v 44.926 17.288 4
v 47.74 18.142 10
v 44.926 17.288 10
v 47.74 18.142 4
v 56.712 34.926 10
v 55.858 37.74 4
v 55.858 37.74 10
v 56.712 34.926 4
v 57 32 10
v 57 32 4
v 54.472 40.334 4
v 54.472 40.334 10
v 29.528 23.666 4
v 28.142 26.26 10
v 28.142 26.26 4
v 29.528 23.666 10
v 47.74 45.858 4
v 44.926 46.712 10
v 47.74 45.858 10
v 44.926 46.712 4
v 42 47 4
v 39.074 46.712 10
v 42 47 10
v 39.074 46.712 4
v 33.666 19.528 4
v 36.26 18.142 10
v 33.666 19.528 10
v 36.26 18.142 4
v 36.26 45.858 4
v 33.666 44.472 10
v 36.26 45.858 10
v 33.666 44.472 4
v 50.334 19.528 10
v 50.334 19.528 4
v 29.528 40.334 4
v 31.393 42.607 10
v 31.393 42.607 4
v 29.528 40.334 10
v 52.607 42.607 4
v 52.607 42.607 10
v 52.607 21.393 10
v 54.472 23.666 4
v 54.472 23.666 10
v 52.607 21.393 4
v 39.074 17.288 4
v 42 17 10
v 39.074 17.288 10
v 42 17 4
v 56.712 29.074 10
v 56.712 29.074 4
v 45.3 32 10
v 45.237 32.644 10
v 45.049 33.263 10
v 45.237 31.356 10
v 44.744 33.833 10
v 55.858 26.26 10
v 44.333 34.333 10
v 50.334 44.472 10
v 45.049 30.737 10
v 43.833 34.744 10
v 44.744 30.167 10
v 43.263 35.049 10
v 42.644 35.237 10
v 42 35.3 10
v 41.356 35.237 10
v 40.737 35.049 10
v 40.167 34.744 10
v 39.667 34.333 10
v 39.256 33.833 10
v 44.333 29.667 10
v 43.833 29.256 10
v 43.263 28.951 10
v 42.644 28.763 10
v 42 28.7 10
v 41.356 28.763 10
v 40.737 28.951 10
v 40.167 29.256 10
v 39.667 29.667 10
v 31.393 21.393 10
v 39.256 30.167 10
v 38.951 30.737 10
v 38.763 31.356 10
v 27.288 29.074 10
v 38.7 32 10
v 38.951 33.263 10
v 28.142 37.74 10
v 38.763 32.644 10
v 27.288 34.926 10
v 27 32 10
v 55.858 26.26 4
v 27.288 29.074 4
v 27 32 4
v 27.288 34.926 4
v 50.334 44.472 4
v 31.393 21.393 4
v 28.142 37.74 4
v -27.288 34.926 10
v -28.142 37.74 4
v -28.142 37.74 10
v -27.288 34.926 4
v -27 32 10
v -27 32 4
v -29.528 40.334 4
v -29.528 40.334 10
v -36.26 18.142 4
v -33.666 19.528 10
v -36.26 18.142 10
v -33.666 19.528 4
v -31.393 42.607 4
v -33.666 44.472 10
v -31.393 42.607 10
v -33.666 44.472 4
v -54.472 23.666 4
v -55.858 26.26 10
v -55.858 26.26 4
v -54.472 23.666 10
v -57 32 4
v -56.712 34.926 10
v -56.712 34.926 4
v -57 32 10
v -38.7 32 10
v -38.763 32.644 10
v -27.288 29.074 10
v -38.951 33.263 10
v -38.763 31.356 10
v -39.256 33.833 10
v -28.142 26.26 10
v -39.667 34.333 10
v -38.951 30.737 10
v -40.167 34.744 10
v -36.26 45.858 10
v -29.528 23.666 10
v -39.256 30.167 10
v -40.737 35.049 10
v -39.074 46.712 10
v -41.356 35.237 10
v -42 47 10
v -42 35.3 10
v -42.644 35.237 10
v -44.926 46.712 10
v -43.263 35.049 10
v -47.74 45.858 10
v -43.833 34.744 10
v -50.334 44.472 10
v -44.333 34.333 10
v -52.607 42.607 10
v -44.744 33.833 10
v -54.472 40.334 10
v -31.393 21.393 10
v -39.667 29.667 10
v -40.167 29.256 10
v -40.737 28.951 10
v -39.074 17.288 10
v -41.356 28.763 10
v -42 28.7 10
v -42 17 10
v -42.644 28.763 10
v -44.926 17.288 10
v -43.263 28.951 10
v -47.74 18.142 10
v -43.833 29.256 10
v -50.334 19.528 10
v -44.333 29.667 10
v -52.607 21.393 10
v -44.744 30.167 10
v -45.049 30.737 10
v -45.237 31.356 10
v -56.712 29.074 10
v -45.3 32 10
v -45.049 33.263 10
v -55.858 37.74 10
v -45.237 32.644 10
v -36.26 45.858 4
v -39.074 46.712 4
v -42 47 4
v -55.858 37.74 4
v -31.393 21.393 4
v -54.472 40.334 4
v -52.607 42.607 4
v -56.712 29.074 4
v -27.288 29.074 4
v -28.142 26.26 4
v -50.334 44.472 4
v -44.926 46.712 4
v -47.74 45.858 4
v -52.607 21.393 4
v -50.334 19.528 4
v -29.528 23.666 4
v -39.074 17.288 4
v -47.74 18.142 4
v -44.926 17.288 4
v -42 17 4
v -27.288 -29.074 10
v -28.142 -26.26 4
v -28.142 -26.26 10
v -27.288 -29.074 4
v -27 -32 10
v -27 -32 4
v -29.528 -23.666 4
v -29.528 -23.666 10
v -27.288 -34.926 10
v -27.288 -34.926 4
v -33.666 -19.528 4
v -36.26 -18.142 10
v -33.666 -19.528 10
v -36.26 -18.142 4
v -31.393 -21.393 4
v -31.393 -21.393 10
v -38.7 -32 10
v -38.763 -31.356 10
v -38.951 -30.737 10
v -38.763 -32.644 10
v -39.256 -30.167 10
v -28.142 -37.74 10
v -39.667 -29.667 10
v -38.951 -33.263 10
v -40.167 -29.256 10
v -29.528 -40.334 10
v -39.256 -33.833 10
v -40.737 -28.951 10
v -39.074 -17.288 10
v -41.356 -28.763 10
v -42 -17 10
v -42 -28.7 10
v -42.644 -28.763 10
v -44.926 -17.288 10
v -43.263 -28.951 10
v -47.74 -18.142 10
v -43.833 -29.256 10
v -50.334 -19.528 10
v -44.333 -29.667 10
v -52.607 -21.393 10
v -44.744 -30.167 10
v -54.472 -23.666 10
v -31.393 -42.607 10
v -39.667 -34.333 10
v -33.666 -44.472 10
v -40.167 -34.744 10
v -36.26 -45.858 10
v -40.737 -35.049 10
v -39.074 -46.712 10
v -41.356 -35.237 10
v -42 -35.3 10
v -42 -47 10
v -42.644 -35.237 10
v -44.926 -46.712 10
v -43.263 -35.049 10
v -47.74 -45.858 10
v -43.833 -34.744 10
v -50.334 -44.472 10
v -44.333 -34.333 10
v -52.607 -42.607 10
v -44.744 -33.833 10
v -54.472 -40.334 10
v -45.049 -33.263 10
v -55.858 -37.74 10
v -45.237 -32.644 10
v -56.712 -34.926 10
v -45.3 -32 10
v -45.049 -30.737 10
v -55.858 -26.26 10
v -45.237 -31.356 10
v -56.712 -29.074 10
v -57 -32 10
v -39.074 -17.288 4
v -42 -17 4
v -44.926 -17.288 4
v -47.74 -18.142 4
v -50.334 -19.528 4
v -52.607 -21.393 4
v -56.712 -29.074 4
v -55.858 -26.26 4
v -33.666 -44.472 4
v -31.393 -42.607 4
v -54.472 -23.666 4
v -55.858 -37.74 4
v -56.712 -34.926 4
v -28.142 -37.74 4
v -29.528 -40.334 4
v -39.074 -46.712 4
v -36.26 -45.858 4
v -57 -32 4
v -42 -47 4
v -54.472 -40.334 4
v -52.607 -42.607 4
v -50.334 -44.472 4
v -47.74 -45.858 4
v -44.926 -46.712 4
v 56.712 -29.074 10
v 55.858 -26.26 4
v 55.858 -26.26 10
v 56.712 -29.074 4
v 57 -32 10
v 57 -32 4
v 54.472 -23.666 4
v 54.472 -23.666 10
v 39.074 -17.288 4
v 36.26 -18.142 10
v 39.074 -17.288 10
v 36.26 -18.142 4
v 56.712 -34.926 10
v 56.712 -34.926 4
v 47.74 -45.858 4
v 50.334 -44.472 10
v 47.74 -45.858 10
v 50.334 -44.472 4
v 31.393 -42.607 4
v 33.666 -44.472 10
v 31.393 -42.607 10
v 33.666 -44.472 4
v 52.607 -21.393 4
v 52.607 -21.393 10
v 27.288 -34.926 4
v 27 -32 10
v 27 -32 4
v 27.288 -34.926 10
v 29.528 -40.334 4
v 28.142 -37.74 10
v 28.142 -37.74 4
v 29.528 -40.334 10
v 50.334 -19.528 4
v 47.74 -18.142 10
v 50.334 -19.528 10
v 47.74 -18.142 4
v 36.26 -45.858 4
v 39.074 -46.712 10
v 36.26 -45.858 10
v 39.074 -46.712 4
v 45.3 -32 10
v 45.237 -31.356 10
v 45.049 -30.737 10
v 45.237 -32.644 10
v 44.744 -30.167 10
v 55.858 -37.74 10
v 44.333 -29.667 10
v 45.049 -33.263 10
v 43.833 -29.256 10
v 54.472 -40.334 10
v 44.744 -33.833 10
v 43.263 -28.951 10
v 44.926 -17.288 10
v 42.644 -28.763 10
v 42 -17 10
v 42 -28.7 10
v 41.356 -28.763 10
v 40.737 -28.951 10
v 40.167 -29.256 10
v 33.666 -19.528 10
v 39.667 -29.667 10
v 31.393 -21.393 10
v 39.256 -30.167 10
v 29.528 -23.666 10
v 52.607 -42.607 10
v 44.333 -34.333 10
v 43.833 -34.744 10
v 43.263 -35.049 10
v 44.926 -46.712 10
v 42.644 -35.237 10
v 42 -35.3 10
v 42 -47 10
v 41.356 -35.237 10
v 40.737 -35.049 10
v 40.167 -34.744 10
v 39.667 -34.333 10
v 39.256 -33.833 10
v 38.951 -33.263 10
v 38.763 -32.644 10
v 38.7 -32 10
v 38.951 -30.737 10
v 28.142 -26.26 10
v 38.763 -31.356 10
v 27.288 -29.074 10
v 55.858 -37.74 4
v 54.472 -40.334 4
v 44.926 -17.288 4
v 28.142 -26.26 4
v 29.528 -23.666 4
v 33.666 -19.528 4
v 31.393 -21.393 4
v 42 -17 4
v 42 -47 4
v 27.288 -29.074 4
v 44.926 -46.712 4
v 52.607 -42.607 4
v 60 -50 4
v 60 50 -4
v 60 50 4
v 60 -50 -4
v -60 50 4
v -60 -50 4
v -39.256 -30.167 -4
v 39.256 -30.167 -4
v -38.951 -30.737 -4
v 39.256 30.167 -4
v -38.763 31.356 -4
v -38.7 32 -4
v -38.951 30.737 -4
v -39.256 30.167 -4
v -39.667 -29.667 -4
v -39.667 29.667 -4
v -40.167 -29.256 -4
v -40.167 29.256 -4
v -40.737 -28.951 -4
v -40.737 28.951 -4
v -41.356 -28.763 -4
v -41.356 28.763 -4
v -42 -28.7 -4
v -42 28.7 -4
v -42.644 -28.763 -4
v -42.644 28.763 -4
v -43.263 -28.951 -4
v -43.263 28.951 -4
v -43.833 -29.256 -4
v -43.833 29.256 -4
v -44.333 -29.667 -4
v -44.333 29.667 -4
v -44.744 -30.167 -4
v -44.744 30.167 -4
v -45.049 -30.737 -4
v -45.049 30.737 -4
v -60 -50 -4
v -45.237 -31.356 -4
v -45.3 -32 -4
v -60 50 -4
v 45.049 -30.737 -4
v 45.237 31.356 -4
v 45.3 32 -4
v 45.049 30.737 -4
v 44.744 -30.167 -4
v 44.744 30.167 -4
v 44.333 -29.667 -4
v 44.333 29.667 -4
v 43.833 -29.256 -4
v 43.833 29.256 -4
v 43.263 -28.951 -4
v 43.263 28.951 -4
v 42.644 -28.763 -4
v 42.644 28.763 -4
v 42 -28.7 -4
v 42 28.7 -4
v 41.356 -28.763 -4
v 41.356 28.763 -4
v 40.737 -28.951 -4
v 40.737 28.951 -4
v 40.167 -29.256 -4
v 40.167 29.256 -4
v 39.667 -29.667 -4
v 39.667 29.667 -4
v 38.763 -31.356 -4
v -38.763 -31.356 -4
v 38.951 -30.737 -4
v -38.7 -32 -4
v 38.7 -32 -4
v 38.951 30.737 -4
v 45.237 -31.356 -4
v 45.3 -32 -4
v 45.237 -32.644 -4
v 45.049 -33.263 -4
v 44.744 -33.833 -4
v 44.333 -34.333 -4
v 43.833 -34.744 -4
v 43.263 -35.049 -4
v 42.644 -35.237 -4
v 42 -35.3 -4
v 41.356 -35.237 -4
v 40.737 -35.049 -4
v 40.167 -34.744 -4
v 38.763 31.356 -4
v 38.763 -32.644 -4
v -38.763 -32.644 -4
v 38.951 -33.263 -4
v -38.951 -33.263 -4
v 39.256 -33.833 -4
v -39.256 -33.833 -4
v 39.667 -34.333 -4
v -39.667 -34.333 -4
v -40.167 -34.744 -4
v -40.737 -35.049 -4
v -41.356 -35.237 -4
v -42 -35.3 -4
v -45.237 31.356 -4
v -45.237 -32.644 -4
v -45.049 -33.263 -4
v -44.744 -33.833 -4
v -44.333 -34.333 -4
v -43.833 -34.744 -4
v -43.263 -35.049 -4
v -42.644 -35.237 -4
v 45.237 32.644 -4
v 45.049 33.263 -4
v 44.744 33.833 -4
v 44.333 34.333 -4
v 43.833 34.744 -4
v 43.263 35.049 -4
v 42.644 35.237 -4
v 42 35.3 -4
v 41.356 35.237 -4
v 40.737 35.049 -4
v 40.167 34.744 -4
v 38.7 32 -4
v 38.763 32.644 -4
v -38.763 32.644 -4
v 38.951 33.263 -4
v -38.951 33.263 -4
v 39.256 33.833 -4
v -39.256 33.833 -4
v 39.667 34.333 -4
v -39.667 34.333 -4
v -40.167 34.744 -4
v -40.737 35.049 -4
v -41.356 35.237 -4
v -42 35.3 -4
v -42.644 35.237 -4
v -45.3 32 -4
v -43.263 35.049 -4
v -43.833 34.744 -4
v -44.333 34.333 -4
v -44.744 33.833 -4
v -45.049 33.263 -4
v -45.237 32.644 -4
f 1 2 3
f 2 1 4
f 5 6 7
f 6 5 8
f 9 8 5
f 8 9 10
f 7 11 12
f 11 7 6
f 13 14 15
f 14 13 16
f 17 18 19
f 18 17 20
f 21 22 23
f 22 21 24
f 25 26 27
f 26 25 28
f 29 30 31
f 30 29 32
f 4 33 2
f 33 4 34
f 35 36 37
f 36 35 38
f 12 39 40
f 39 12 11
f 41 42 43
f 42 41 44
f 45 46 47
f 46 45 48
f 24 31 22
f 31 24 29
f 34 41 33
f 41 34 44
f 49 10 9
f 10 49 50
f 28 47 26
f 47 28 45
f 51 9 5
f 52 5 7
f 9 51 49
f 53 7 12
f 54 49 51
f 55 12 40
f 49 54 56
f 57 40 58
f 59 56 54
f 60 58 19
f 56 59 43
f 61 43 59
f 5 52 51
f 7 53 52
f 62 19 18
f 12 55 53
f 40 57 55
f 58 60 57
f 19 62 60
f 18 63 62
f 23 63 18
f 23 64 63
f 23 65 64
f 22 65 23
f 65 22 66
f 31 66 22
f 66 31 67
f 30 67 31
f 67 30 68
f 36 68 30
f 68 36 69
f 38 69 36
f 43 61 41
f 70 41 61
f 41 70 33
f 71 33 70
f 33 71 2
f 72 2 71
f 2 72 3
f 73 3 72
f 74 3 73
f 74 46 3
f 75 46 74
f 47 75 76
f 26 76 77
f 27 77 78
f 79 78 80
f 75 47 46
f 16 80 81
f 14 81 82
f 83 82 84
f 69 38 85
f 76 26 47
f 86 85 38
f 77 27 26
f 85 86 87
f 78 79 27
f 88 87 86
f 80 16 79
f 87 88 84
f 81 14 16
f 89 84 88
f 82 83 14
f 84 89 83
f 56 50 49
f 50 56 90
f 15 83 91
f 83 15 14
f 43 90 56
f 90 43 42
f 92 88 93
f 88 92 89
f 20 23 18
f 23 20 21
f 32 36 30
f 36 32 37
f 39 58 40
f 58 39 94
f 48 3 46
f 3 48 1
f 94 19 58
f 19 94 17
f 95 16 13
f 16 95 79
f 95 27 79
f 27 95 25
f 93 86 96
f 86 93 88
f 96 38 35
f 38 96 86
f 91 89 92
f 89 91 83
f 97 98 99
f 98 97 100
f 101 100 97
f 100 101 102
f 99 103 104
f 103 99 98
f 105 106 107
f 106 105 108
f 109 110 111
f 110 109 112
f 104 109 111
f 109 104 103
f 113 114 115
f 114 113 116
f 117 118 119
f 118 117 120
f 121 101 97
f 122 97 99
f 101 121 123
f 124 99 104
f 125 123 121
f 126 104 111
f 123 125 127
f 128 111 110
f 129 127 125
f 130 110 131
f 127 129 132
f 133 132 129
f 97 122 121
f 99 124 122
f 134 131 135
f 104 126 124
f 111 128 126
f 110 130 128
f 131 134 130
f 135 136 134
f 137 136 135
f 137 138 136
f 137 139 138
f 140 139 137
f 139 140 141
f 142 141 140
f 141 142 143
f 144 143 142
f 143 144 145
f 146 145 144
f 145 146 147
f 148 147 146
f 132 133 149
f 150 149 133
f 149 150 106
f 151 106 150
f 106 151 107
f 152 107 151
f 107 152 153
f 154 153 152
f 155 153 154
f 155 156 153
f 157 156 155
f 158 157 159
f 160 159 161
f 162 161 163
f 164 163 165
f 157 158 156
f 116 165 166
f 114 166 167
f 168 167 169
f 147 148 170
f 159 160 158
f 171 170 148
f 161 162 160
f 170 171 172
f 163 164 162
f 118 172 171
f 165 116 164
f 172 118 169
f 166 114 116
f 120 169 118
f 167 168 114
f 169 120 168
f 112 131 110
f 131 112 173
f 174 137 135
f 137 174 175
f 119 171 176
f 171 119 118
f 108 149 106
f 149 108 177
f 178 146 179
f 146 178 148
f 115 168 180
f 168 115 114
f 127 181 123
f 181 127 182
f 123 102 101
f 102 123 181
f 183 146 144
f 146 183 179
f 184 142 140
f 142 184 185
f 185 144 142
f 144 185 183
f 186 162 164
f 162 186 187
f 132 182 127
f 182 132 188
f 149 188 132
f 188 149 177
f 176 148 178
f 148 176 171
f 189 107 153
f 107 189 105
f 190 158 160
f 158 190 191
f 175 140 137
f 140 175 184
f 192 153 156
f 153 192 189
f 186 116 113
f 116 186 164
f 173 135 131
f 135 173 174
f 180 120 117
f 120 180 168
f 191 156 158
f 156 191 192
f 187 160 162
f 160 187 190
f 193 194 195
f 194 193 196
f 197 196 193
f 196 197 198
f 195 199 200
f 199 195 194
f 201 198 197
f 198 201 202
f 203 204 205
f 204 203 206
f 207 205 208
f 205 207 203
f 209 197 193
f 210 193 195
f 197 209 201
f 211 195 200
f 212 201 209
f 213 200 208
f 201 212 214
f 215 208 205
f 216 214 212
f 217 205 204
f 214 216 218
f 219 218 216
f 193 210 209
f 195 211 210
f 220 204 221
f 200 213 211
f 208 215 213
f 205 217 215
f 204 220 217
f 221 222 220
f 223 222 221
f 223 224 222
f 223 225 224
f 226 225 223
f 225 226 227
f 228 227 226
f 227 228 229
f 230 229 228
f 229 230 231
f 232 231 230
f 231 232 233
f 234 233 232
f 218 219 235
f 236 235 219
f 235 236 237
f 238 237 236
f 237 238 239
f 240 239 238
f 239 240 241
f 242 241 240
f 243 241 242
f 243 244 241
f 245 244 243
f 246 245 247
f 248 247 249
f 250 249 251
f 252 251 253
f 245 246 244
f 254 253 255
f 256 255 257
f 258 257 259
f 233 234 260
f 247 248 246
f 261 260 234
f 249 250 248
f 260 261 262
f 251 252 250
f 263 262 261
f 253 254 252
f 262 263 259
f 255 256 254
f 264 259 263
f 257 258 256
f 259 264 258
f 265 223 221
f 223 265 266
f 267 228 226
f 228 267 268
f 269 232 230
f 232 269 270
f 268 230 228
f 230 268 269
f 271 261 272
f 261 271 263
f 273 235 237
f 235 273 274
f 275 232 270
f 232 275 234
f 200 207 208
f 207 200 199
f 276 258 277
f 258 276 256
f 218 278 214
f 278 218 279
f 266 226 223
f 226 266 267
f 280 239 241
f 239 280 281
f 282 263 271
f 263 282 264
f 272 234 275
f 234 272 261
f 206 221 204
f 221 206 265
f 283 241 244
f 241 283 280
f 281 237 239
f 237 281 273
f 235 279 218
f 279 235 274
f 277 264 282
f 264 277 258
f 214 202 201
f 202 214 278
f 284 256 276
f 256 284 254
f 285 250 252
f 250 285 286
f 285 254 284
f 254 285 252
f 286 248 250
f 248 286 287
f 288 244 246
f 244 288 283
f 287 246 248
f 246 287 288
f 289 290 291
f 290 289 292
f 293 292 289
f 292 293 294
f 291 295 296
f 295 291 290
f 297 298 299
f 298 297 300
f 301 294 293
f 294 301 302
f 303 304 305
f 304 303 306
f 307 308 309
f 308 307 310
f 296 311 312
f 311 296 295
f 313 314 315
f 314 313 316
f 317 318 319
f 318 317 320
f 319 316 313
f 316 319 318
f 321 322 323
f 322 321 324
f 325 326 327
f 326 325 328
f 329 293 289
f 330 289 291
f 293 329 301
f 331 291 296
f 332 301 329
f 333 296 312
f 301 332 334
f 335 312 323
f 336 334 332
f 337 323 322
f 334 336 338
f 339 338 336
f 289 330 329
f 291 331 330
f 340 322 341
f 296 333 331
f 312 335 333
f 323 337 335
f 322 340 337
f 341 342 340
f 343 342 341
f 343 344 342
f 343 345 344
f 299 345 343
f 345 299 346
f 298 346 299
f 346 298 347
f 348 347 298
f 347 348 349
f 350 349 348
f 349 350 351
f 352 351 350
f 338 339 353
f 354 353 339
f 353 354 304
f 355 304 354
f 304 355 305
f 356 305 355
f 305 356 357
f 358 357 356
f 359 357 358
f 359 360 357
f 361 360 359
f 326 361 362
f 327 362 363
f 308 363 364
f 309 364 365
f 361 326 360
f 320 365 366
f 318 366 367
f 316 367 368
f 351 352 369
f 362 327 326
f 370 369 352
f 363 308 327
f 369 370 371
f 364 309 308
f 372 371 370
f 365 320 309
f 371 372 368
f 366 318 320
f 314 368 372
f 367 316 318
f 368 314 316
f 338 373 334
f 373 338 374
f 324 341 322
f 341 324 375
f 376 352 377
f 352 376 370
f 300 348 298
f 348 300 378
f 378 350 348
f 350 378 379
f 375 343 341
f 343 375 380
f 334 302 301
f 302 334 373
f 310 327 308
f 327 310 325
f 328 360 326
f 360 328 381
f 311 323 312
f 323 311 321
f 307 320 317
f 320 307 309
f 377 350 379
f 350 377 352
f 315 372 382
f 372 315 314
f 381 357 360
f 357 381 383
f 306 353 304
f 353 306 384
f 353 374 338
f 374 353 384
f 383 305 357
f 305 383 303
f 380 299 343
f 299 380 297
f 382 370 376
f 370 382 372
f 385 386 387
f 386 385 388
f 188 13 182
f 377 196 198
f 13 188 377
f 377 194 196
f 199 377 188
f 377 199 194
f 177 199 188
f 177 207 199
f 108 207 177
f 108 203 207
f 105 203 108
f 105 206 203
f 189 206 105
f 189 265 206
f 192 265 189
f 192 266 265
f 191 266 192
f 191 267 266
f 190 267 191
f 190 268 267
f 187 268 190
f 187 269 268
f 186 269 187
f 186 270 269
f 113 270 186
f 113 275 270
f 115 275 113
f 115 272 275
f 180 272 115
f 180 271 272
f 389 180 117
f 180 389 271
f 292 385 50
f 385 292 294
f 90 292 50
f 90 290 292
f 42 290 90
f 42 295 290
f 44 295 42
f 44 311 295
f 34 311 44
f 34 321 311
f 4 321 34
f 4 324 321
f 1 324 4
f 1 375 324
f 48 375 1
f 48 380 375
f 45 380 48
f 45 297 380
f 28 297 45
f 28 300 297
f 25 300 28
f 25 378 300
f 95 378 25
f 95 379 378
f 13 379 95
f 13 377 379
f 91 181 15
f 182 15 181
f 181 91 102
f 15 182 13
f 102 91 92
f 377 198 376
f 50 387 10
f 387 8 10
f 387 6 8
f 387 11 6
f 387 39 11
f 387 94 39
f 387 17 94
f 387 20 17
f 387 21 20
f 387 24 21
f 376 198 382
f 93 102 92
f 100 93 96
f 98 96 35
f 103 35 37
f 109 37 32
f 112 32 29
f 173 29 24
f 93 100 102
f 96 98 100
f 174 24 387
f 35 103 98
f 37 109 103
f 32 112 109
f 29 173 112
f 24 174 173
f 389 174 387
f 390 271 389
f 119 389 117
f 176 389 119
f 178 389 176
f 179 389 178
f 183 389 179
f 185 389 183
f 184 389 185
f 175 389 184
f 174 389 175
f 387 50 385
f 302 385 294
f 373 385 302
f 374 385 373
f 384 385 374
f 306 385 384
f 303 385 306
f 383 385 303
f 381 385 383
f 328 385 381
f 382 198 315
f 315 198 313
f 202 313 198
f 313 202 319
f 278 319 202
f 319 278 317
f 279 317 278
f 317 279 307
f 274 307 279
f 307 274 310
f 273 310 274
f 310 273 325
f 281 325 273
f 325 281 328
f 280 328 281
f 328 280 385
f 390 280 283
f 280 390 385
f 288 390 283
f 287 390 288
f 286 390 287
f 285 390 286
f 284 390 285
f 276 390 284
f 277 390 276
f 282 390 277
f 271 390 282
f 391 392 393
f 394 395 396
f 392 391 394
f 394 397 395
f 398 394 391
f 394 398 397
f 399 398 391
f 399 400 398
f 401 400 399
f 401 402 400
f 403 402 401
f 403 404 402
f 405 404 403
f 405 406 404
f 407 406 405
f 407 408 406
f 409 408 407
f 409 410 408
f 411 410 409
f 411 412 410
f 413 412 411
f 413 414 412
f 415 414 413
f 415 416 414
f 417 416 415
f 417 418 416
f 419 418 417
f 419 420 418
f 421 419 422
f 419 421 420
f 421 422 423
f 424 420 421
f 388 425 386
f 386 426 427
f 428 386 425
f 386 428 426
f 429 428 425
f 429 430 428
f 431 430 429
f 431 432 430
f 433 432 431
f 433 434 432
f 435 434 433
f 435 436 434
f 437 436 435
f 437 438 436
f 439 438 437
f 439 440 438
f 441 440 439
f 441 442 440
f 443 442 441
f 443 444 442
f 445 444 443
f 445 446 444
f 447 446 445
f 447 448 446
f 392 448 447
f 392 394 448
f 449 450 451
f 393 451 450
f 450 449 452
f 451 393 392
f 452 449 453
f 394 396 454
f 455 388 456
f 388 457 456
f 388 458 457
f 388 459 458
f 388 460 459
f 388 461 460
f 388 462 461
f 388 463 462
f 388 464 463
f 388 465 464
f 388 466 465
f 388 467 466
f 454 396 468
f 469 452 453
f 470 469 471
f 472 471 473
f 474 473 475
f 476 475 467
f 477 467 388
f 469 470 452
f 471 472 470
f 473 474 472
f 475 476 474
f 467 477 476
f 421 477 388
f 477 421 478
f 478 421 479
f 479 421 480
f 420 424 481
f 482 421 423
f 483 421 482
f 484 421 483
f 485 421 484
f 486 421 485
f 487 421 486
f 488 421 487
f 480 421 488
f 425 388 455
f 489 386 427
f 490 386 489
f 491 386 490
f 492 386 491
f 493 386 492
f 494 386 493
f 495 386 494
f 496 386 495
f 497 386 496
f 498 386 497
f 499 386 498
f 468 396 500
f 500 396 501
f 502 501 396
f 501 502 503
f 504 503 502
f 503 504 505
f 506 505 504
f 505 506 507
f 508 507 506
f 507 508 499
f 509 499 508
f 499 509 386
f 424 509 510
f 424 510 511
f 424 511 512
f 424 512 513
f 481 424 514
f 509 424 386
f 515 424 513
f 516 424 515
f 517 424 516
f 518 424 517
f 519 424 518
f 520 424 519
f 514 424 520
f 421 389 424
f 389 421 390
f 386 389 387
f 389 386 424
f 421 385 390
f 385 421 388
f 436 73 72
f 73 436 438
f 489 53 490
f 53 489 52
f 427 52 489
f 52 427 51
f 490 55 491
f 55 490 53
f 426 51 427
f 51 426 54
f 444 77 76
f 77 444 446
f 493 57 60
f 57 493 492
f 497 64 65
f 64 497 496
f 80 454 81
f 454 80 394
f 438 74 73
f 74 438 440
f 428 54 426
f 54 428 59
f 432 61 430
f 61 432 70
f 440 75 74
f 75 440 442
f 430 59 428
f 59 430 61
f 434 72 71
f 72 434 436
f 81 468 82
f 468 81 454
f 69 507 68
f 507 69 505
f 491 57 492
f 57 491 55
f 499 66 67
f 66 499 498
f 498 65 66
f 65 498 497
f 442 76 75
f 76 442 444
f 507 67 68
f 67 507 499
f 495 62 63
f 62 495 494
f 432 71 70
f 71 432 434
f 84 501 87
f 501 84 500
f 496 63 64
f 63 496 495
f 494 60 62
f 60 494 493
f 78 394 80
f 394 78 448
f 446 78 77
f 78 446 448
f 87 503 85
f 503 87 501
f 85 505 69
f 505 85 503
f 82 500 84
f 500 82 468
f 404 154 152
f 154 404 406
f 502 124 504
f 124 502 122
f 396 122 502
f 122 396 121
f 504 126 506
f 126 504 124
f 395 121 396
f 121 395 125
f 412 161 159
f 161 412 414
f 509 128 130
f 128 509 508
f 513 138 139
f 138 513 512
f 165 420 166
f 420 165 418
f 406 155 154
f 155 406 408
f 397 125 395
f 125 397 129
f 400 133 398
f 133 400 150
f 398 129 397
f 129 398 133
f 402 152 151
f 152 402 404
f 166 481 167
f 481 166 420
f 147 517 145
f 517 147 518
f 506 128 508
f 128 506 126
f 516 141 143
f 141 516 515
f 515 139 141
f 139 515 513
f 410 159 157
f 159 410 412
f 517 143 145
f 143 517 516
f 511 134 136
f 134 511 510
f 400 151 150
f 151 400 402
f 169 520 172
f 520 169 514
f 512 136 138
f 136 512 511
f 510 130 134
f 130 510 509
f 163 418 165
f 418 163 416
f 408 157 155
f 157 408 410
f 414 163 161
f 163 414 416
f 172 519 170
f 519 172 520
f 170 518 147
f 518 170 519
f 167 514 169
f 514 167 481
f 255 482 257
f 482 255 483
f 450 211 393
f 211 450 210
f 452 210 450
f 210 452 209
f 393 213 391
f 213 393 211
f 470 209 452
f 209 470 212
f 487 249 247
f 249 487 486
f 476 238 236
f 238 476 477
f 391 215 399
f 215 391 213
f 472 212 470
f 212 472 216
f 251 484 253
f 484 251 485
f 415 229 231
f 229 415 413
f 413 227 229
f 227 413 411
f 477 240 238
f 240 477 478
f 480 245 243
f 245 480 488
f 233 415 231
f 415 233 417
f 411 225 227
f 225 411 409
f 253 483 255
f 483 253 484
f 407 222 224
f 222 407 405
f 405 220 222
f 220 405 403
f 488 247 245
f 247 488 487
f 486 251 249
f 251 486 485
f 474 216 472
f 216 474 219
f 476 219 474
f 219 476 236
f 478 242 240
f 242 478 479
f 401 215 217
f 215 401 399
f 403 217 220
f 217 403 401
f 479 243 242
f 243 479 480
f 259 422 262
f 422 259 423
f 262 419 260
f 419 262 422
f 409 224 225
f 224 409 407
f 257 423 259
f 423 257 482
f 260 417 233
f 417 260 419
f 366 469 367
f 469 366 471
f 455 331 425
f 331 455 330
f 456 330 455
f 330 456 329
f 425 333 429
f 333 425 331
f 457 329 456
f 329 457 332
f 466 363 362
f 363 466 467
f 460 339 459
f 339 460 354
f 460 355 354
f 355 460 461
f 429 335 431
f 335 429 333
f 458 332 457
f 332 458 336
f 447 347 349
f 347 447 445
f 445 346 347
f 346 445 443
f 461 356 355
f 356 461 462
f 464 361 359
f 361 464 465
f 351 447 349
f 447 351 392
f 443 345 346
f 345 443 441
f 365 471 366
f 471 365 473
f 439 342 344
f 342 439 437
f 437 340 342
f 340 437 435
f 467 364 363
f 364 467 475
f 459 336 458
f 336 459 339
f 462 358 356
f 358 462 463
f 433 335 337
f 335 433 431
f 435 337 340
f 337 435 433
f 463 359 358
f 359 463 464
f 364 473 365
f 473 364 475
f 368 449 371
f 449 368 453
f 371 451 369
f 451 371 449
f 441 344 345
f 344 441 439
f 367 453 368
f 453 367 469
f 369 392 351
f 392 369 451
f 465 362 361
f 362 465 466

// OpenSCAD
$fn = 32;

// ----------------------------------------------------------------------
// Anchor pads 120 x 100 x 14
// four corner bosses with anchor holes
// ----------------------------------------------------------------------

// --- parameters (mm) ---
plate = [120, 100, 8];  // base plate size (x, y, z)
pads = 4;               // boss count, one per corner
edge = 18;              // boss centre offset from the plate edge
boss_d = 30;            // boss diameter
boss_h = 6;             // boss height above the base plate
hole_d = 6.6;           // hole diameter

// --- derived feature positions (mm) ---
height = plate[2] + boss_h;      // = 14   overall height of the part
corner_x = plate[0] / 2 - edge;  // = 42   boss centre X
corner_y = plate[1] / 2 - edge;  // = 32   boss centre Y
feature_centers = [
  [corner_x, corner_y],
  [-corner_x, corner_y],
  [-corner_x, -corner_y],
  [corner_x, -corner_y]
];   // boss centres, anchor holes are drilled there

// base plate, four bosses standing on it, anchor holes all the way through
difference() {
  union() {
    cube(plate, center = true);
    for (centre = feature_centers)
      translate([centre[0], centre[1], plate[2] / 2 - 1])
        cylinder(d = boss_d, h = boss_h + 1);
  }
  for (centre = feature_centers)
    translate([centre[0], centre[1], -height])
      cylinder(d = hole_d, h = 2 * height + 2);  // through boss and plate
}
